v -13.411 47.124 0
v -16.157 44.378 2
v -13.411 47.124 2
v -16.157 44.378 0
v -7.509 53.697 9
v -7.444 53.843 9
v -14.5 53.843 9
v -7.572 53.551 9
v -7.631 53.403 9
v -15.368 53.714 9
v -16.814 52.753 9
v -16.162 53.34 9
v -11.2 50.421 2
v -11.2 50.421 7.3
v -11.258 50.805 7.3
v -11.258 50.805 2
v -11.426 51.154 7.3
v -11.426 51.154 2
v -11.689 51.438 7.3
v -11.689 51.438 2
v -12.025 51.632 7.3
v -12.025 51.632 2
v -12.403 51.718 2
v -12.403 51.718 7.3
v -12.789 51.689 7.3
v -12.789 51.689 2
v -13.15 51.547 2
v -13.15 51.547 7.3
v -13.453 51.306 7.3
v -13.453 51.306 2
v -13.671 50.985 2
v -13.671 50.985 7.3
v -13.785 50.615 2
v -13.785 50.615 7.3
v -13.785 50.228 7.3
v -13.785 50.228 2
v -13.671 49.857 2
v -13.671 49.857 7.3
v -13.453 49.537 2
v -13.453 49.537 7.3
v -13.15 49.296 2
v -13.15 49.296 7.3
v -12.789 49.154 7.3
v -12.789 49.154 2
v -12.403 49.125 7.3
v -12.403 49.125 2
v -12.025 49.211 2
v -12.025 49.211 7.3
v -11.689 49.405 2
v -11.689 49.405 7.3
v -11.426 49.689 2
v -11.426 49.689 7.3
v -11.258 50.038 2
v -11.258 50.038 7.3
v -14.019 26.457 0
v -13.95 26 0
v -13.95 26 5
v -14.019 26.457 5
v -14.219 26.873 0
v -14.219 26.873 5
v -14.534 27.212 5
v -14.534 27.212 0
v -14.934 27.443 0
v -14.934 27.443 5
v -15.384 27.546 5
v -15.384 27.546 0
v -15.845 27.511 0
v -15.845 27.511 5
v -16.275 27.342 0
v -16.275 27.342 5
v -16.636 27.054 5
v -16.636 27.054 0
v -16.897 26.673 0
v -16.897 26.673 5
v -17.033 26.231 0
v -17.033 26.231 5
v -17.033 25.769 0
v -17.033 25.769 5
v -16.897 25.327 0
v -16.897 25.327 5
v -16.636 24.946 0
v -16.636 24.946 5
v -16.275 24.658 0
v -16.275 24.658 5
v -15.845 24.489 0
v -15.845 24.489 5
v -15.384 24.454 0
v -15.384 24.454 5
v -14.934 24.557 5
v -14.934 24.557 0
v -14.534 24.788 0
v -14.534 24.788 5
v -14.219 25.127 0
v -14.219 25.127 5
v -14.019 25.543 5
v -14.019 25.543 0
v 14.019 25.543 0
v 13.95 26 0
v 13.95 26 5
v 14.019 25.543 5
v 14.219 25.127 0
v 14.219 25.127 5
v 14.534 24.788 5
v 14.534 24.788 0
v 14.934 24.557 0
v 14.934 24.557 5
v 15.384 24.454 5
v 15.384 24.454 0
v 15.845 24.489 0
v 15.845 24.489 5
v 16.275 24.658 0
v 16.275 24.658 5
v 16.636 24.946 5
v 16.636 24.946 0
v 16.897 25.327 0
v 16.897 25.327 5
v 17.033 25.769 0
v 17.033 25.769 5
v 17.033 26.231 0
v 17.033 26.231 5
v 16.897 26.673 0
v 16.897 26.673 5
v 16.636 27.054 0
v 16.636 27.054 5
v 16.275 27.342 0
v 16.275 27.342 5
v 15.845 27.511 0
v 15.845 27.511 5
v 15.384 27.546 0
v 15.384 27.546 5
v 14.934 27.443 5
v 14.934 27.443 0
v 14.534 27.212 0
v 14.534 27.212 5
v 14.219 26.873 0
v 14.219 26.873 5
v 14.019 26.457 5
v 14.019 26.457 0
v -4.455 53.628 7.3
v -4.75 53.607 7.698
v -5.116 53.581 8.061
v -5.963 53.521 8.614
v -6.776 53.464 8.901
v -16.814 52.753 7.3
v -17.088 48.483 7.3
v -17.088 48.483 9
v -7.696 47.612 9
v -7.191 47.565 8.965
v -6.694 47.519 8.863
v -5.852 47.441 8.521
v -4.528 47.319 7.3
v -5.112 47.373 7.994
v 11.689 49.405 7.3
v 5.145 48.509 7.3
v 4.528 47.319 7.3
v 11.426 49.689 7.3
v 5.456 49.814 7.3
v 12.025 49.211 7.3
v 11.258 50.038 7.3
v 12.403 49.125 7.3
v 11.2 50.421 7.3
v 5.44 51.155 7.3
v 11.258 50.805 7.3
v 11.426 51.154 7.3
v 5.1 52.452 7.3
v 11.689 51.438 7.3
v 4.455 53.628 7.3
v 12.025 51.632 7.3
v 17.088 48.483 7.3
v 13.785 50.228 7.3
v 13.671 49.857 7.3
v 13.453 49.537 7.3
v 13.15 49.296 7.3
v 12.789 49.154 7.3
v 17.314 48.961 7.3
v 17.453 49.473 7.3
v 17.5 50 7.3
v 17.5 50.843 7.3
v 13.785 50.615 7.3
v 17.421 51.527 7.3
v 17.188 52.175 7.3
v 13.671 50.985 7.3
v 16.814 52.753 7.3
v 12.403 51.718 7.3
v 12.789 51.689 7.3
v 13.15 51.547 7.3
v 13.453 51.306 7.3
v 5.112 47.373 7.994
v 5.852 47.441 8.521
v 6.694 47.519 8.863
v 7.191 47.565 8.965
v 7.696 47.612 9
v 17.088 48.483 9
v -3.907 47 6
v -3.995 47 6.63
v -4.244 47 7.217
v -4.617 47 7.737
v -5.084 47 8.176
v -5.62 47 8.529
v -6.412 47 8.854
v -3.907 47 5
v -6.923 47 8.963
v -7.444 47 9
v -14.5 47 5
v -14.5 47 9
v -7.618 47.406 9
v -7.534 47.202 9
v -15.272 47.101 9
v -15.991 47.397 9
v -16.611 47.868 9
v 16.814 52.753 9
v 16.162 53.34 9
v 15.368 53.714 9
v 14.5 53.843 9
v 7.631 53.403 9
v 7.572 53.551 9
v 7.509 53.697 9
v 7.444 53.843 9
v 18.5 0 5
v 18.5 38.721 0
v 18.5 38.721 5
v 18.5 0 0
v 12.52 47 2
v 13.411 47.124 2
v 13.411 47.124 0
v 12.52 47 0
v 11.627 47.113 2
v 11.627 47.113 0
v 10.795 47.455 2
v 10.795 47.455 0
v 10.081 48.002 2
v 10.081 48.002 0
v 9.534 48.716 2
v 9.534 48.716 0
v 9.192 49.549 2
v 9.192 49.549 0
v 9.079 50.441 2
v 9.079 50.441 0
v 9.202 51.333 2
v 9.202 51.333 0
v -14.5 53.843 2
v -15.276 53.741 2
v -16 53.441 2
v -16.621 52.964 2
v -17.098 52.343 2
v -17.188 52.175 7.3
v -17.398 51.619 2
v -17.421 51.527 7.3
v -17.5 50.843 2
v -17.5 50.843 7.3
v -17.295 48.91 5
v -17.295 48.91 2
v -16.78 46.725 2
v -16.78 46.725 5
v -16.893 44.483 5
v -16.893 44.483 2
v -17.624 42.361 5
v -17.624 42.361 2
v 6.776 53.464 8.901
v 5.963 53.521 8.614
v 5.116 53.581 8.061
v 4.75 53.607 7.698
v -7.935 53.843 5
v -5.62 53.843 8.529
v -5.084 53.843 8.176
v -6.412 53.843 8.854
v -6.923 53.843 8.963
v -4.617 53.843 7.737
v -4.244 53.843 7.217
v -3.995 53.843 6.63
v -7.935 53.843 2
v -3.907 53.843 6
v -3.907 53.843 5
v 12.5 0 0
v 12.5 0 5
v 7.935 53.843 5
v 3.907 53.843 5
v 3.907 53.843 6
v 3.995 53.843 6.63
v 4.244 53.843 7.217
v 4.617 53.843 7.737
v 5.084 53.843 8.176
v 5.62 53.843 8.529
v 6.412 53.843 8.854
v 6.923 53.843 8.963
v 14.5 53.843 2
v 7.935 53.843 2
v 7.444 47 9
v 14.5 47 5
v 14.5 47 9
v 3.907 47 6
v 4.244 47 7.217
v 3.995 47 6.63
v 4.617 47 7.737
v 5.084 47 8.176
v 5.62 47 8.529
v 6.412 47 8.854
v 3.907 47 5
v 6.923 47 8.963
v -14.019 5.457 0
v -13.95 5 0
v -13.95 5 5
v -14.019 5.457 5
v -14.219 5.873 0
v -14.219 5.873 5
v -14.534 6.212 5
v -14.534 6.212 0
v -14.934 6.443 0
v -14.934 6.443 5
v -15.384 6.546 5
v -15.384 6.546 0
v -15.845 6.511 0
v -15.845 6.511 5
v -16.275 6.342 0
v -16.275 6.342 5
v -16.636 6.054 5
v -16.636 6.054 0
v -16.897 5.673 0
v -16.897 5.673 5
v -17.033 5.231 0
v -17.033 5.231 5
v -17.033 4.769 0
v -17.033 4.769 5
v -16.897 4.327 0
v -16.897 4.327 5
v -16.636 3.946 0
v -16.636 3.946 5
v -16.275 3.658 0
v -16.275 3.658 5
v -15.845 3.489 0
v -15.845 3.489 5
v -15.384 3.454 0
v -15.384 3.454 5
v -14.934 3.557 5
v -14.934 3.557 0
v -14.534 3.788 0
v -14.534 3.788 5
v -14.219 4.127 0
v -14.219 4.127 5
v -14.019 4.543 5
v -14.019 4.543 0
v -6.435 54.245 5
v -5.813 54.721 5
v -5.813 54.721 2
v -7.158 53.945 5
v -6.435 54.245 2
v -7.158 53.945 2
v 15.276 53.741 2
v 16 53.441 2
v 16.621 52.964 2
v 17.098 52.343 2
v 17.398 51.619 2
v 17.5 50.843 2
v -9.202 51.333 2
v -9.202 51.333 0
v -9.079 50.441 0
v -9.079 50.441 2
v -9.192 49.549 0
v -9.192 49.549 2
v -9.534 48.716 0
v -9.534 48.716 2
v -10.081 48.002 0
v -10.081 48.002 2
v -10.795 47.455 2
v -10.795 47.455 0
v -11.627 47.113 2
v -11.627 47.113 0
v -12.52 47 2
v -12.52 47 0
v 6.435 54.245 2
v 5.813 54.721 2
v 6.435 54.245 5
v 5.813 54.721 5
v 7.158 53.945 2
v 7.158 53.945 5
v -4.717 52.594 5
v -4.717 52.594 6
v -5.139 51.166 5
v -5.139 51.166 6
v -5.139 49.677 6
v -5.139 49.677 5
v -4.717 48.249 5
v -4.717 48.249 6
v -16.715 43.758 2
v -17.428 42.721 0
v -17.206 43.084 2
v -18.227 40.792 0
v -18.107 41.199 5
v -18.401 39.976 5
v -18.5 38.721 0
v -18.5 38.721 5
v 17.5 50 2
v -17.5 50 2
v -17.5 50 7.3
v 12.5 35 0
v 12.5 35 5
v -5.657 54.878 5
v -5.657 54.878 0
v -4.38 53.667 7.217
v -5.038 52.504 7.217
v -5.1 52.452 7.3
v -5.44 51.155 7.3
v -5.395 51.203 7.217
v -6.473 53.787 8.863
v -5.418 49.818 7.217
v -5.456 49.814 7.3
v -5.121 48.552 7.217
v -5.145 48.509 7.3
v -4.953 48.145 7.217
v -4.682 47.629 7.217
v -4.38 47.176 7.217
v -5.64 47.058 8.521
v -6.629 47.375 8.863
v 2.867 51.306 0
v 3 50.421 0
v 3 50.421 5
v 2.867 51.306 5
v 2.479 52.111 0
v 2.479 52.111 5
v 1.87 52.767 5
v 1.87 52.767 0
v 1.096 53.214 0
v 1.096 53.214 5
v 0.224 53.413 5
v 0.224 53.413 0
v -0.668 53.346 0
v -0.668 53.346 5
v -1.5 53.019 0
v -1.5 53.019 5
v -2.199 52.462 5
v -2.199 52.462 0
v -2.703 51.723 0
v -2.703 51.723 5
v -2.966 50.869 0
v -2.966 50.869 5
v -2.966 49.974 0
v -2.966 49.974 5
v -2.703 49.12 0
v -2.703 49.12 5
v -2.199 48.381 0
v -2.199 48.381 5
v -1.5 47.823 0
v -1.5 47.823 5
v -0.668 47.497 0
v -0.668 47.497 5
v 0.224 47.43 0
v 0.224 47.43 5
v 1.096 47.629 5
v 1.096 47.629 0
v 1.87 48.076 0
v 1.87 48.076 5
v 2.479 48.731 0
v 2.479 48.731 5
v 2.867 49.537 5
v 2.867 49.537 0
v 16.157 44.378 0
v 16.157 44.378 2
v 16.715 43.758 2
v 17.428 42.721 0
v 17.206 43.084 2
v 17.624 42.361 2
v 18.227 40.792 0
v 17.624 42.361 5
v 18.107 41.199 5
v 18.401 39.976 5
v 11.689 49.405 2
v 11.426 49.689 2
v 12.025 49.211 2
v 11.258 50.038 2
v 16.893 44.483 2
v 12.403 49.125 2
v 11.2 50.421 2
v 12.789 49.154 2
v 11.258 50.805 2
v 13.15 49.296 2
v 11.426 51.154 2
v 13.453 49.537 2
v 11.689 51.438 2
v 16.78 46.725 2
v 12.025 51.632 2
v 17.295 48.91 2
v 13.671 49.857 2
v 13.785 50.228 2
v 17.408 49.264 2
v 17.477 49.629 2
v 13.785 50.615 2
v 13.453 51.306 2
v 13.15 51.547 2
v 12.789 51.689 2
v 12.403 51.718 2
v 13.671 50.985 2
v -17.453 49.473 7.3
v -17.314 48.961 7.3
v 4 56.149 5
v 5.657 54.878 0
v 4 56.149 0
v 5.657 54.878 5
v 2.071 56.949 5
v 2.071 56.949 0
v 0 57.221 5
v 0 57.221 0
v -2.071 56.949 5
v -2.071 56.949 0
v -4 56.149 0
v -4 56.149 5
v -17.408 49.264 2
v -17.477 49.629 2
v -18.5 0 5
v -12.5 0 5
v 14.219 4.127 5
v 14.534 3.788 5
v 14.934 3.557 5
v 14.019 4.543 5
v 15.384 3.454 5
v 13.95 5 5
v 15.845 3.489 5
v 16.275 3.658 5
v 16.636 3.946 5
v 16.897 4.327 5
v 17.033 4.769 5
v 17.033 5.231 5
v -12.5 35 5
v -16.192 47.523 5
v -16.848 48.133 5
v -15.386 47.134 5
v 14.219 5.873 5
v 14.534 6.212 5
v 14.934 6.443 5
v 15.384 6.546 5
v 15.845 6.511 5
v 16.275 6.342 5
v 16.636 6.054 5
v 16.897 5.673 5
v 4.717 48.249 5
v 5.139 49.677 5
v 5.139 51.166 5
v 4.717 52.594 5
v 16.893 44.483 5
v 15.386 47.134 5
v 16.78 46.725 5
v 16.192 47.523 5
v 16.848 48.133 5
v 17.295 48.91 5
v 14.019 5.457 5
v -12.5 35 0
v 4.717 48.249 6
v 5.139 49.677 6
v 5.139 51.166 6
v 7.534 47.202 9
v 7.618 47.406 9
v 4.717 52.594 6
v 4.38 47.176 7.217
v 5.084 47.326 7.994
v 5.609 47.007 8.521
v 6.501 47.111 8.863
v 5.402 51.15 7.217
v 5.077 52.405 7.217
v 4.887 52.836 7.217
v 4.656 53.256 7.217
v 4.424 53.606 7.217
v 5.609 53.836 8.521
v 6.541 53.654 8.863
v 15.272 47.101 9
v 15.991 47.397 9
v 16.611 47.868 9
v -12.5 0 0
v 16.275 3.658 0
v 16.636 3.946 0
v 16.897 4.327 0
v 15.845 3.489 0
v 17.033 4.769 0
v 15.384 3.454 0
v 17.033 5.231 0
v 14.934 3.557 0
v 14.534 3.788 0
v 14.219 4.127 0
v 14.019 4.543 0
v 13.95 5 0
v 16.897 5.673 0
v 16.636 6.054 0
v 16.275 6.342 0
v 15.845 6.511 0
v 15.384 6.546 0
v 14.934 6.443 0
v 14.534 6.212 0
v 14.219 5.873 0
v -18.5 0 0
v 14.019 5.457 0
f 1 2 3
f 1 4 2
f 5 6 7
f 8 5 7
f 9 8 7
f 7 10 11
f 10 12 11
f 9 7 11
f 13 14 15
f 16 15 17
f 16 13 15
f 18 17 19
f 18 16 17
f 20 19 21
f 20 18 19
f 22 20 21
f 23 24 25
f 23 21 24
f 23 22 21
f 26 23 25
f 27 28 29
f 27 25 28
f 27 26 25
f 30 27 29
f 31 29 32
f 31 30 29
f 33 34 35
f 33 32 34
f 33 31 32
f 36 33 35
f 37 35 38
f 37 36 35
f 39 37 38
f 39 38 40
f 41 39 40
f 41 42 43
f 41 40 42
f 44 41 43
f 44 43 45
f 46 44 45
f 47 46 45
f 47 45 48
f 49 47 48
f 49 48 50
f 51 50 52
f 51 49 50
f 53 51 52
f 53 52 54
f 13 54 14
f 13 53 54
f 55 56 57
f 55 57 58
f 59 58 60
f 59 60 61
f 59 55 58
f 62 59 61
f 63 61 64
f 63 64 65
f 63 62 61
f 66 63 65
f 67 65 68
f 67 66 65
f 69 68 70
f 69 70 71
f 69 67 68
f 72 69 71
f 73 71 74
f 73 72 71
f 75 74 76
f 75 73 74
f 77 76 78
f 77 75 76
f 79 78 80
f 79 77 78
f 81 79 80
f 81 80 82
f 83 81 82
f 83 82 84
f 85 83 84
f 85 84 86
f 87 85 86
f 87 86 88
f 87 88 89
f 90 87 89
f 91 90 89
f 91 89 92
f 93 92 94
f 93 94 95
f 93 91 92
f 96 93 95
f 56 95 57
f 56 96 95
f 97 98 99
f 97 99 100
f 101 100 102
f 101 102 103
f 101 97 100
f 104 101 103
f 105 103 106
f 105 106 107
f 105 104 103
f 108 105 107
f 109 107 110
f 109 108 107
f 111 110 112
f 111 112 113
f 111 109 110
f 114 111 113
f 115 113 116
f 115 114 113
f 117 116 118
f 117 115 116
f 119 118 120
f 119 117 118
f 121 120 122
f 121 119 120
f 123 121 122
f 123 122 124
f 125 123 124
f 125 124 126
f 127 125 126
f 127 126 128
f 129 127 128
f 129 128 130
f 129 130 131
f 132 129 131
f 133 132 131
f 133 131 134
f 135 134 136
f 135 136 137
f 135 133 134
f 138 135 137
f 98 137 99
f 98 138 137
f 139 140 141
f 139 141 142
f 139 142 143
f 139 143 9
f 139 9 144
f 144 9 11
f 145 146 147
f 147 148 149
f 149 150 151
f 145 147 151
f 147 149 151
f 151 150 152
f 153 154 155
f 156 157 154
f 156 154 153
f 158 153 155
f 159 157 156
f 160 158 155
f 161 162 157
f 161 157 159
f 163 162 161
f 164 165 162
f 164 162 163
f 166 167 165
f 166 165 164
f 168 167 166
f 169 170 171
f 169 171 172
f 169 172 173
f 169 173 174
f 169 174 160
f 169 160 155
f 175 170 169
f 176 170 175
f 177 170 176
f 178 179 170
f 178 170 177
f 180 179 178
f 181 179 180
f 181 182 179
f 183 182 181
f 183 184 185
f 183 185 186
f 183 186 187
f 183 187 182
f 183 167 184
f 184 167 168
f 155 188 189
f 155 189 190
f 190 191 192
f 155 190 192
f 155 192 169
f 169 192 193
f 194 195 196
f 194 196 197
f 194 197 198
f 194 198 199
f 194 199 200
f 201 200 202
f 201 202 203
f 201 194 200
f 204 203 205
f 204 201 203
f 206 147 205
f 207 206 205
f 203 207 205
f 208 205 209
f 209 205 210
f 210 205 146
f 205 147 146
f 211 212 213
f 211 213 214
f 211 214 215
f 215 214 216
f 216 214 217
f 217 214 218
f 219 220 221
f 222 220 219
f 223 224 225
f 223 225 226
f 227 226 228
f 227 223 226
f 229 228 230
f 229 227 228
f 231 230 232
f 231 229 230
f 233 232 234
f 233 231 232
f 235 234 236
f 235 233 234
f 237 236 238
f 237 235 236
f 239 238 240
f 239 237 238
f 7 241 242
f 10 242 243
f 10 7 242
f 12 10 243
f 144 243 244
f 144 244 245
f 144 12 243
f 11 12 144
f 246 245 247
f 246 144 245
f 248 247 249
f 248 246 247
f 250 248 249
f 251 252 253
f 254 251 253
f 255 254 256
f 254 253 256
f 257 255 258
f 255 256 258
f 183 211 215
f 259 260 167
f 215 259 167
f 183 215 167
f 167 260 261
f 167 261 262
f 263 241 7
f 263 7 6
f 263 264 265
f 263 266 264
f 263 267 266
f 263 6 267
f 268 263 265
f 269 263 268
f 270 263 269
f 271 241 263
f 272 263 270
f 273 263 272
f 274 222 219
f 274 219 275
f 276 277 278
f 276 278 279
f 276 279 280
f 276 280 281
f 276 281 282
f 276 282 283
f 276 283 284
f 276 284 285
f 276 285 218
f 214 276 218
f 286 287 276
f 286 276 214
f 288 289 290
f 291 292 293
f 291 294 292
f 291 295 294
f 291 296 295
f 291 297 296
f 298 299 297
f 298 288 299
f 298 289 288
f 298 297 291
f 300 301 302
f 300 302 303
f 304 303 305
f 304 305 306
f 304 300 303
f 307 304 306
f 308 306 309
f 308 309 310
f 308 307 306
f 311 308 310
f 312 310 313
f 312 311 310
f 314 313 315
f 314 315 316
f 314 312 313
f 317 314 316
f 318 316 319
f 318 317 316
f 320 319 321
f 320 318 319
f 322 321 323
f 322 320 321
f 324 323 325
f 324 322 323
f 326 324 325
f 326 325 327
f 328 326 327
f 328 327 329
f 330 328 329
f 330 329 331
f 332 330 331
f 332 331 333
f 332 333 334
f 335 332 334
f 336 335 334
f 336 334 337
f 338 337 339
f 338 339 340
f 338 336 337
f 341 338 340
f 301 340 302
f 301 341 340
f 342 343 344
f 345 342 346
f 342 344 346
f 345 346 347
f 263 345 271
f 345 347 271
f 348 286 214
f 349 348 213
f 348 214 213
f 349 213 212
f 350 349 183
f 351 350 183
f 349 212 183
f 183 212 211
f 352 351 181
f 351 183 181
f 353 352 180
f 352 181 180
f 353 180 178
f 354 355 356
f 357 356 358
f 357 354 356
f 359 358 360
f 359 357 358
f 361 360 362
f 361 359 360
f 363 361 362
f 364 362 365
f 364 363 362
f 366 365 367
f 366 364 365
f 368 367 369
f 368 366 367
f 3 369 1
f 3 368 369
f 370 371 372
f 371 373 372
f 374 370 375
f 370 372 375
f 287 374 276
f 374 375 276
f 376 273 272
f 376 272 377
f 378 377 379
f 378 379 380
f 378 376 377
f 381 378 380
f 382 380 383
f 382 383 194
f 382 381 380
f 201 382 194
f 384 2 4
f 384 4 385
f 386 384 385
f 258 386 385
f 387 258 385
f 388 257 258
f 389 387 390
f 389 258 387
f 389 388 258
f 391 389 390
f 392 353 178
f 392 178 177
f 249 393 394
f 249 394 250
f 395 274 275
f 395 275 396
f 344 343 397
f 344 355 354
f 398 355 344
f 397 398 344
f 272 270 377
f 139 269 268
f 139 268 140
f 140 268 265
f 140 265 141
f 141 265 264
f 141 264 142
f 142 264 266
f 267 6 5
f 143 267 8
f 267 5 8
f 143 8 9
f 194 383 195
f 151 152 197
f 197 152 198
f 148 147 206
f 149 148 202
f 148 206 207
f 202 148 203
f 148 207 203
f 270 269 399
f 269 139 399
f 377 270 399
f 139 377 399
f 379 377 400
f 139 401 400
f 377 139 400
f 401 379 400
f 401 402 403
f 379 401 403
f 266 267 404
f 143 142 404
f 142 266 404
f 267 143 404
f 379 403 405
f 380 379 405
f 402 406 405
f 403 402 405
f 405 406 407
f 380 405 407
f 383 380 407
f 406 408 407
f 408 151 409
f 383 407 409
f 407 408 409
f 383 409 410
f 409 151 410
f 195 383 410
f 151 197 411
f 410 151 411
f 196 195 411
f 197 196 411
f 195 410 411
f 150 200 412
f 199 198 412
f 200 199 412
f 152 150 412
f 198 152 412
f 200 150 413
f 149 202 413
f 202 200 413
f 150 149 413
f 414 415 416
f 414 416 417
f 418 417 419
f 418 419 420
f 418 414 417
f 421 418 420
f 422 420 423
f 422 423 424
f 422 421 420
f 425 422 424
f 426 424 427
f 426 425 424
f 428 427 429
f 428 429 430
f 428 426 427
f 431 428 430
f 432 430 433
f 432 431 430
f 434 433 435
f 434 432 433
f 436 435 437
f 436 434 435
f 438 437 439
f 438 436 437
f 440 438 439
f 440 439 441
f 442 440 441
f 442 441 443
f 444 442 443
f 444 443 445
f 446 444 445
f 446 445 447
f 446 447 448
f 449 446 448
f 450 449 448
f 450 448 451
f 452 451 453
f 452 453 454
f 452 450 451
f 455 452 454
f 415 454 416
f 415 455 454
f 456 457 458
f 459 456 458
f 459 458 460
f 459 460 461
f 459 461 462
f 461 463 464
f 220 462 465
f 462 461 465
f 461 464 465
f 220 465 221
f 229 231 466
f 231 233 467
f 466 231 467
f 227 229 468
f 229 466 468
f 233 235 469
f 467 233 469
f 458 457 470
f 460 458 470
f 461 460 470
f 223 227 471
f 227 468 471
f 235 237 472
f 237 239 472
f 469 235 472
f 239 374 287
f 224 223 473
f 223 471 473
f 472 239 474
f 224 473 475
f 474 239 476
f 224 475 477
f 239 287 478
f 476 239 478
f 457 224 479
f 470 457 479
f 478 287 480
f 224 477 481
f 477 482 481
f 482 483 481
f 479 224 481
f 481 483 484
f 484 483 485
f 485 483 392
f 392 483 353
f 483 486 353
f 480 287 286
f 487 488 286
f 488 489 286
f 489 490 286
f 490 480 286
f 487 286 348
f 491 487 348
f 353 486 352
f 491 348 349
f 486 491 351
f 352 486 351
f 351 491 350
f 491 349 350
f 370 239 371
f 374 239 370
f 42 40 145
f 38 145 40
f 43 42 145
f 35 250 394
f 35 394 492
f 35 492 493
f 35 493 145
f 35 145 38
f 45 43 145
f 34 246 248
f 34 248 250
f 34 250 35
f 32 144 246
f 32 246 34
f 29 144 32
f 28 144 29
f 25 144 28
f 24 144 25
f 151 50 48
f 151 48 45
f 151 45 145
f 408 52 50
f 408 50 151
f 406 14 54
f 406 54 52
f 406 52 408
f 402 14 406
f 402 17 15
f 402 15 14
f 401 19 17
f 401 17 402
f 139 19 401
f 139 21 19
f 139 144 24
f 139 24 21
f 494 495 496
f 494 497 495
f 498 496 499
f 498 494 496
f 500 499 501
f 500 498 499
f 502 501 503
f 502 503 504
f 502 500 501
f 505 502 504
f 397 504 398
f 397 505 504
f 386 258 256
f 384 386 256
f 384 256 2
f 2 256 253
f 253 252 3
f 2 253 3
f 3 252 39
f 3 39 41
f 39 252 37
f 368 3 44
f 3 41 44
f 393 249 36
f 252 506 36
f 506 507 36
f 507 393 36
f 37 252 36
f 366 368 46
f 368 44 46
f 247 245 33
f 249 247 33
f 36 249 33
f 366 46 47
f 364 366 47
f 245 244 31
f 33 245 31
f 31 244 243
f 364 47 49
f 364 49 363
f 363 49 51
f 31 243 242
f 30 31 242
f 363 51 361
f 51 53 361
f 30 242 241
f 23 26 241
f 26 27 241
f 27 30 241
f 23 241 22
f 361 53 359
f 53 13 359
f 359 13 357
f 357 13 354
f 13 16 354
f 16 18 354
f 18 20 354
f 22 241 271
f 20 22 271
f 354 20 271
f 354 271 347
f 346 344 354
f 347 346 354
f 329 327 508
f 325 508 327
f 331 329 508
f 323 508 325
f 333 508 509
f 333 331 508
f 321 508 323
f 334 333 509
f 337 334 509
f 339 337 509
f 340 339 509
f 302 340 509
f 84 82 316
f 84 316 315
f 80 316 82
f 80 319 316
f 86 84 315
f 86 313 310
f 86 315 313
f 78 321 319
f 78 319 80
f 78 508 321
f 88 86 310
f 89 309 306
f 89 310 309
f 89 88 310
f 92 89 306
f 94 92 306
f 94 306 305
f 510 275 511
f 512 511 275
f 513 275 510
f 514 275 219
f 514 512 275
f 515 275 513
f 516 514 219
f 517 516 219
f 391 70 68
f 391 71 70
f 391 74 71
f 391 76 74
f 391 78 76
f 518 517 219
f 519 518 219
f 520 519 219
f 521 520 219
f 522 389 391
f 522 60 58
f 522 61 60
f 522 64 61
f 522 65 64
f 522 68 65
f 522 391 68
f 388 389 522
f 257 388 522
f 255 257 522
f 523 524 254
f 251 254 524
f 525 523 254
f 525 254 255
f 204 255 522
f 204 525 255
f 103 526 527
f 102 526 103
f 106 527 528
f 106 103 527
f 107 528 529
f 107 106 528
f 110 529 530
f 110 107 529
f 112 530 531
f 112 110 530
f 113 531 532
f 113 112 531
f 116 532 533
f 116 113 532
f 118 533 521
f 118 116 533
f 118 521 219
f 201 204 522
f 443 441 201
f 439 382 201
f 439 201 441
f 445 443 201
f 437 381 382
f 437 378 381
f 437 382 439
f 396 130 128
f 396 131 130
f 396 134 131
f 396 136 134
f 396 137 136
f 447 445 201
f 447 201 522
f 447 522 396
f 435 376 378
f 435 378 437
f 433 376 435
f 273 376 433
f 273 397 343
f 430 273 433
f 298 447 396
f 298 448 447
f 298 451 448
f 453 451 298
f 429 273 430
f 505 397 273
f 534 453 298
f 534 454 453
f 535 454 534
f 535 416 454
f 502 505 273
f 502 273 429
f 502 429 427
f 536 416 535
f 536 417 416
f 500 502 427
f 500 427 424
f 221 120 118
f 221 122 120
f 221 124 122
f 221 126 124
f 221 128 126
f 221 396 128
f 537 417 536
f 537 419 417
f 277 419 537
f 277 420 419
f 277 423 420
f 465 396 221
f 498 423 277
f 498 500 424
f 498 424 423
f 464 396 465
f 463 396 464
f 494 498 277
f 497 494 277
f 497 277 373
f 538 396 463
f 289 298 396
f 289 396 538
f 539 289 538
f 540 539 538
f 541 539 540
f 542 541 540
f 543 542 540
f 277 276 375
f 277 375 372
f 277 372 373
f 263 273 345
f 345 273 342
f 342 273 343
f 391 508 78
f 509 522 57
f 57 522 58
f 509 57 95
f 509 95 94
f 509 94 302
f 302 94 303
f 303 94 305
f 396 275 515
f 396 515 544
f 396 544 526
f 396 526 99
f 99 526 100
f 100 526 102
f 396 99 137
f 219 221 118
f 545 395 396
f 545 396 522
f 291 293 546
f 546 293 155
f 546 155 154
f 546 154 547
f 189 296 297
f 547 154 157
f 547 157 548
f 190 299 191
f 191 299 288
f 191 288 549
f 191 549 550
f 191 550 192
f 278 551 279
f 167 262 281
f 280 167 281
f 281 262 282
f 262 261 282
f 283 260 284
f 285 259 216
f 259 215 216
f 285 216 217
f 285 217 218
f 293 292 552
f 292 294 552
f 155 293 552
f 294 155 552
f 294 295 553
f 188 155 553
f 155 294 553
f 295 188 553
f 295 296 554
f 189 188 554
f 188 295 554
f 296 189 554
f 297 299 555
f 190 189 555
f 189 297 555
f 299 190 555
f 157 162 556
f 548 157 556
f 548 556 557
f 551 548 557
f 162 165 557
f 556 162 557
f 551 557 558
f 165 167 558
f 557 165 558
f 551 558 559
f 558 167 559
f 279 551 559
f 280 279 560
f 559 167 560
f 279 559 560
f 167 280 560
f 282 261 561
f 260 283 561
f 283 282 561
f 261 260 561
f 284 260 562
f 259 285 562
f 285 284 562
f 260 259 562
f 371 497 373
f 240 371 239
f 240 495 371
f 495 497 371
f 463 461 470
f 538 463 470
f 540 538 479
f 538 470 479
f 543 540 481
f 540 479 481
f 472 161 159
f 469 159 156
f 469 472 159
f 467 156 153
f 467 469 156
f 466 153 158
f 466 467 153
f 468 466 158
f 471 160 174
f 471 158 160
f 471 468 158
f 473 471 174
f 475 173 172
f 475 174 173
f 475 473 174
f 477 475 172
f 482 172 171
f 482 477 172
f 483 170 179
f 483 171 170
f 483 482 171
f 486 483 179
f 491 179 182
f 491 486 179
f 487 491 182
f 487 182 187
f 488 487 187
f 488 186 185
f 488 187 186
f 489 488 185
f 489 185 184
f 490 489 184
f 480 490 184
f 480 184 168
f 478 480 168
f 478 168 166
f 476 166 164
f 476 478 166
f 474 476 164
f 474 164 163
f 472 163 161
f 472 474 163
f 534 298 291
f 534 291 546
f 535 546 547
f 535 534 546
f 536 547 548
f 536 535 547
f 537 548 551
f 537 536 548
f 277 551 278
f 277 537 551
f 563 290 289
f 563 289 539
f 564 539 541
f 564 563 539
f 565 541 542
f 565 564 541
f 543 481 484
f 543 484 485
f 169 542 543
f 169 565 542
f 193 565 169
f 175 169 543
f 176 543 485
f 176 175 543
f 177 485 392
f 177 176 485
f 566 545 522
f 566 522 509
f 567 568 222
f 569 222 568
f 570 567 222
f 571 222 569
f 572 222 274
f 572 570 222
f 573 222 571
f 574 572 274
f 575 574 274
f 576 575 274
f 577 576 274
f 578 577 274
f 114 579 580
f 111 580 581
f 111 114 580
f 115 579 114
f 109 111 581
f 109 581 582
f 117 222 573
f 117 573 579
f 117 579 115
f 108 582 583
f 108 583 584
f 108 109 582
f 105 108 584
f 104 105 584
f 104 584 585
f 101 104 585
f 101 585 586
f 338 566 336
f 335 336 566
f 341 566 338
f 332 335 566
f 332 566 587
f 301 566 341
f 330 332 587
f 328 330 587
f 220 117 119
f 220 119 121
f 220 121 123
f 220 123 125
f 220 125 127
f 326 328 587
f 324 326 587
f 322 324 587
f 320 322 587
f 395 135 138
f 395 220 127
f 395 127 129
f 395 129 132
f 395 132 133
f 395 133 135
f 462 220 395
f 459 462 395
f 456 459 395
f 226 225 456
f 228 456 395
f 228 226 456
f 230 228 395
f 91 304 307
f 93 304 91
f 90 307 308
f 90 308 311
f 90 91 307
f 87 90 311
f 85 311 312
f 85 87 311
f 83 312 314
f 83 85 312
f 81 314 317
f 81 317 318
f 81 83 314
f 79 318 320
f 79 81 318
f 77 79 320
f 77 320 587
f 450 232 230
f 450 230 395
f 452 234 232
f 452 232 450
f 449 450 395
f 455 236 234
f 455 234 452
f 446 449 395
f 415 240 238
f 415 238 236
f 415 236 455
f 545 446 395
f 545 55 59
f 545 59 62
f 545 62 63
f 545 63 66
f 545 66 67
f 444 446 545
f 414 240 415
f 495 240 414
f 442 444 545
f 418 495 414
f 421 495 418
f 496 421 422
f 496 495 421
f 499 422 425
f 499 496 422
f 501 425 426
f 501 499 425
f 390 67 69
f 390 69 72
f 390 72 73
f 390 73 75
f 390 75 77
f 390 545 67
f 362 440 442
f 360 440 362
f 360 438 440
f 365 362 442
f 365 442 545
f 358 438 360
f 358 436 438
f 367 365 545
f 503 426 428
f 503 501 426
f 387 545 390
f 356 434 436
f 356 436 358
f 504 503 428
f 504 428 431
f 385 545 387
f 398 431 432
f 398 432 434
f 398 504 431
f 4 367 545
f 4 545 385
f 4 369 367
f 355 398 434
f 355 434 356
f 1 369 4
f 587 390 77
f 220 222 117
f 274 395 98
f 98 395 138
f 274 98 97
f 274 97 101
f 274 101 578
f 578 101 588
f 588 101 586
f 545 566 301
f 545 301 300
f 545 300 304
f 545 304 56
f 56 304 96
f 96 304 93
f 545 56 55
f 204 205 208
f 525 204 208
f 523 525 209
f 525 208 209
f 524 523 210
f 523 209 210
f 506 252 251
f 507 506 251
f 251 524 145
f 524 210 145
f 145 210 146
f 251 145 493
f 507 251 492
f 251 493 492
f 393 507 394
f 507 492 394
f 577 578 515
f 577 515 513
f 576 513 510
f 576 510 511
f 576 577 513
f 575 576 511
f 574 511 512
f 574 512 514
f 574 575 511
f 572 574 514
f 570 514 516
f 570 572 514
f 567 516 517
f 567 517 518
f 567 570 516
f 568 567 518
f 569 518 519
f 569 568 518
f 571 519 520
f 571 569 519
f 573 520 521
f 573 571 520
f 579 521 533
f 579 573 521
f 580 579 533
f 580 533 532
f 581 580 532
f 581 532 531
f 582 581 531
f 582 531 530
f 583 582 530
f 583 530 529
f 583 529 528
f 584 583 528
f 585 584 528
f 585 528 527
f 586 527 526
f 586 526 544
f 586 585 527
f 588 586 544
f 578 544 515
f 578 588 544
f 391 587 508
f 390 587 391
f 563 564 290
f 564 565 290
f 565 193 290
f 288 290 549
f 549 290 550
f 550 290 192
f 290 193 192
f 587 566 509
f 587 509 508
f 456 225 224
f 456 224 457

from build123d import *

# Parameters (mm, degrees)
SKETCH_1_R           = 3
SKETCH_1_R_2         = 1.55
EXTRUDE_1_DEPTH      = 5
EXTRUDE_2_DEPTH      = 4
EXTRUDE_2_DEPTH_BACK = 3
SKETCH_2_R           = 1.3
FILLET_1_R           = 8
FILLET_2_R           = 3
CUT_EXTRUDE_1_REACH  = 62.544
SKETCH_3_R           = 3.421397557
CUT_EXTRUDE_2_DEPTH  = 1.7
FILLET_START         = 2
FILLET_3_DEPTH       = 3


with BuildPart() as part:
    # 草图1 → 凸台-拉伸1 (new body)
    with BuildSketch(Plane.XY):
        Polygon((-12.5, 0), (-18.5, 0), (-18.5, 42.034916596), (0, 60.534916596), (18.5, 42.034916596), (18.5, 0), (12.5, 0), (12.5, 35), (-12.5, 35), align=None)
        with Locations((0, 50.421397557)):
            Circle(SKETCH_1_R, mode=Mode.SUBTRACT)
        with Locations((-15.5, 5)):
            Circle(SKETCH_1_R_2, mode=Mode.SUBTRACT)
        with Locations((-15.5, 26)):
            Circle(SKETCH_1_R_2, mode=Mode.SUBTRACT)
        with Locations(Location((15.5, 5, 0), (0, 0, 180))):
            Circle(SKETCH_1_R_2, mode=Mode.SUBTRACT)
        with Locations(Location((15.5, 26, 0), (0, 0, 180))):
            Circle(SKETCH_1_R_2, mode=Mode.SUBTRACT)
    extrude(amount=EXTRUDE_1_DEPTH)

    # 草图2 → 凸台-拉伸2 (add, two sides: drawn at the far end of the back side and taken through both)
    # profile 1 of 2: a face of its own
    with BuildSketch(Plane.XY.offset(5).offset(-EXTRUDE_2_DEPTH_BACK)):
        with BuildLine():
            Line((17.5, 47), (3.906515802, 47))
            ThreePointArc((3.906515802, 47), (5.192959363, 50.421397557), (3.906515802, 53.842795113))
            Line((3.906515802, 53.842795113), (17.5, 53.842795113))
            Line((17.5, 53.842795113), (17.5, 47))
        make_face()
        with Locations(Location((12.5, 50.421397557, 0), (0, 0, 180))):
            Circle(SKETCH_2_R, mode=Mode.SUBTRACT)
    # profile 2 of 2: a face of its own
    with BuildSketch(Plane.XY.offset(5).offset(-EXTRUDE_2_DEPTH_BACK)):
        with BuildLine():
            Line((-17.5, 47), (-17.5, 53.842795113))
            Line((-17.5, 53.842795113), (-3.906515802, 53.842795113))
            ThreePointArc((-3.906515802, 53.842795113), (-5.192959363, 50.421397557), (-3.906515802, 47))
            Line((-3.906515802, 47), (-17.5, 47))
        make_face()
        with Locations((-12.5, 50.421397557)):
            Circle(SKETCH_2_R, mode=Mode.SUBTRACT)
    extrude(amount=EXTRUDE_2_DEPTH + EXTRUDE_2_DEPTH_BACK)

    # 圆角1
    fillet_1_edges = [part.edges().sort_by_distance(p)[0] for p in [
        (-18.5, 42.034916596, 2.5),
        (0, 60.534916596, 2.5),
        (18.5, 42.034916596, 2.5),
    ]]
    fillet(fillet_1_edges, radius=FILLET_1_R)

    # 圆角2
    fillet_2_edges = [part.edges().sort_by_distance(p)[0] for p in [
        (-6.692121483, 53.842795113, 3.5),
        (-17.5, 47, 5.5),
        (-5.192959363, 50.421397557, 9),
        (-17.5, 53.842795113, 5.5),
        (6.692121483, 53.842795113, 3.5),
        (17.5, 53.842795113, 5.5),
        (5.192959363, 50.421397557, 9),
        (17.5, 47, 5.5),
    ]]
    fillet(fillet_2_edges, radius=FILLET_2_R)

    # 草图3 → 切除-拉伸1 (cut, up to next)
    with BuildSketch(Plane(origin=(0, 0, 2), x_dir=(-1, 0, 0), z_dir=(0, 0, -1)), mode=Mode.PRIVATE) as cut_extrude_1_sk1:
        with Locations((-12.5, 50.421397557)):
            Circle(SKETCH_3_R)
    cut_extrude_1_tool1 = extrude(cut_extrude_1_sk1.sketch, amount=CUT_EXTRUDE_1_REACH, mode=Mode.PRIVATE) & part.part
    # 草图3 → 切除-拉伸1 (cut, up to next)
    with BuildSketch(Plane(origin=(0, 0, 2), x_dir=(-1, 0, 0), z_dir=(0, 0, -1)), mode=Mode.PRIVATE) as cut_extrude_1_sk2:
        with Locations((12.5, 50.421397557)):
            Circle(SKETCH_3_R)
    cut_extrude_1_tool2 = extrude(cut_extrude_1_sk2.sketch, amount=CUT_EXTRUDE_1_REACH, mode=Mode.PRIVATE) & part.part
    add(cut_extrude_1_tool1.solids().sort_by_distance((12.5, 50.421398, 2))[0], mode=Mode.SUBTRACT)
    add(cut_extrude_1_tool2.solids().sort_by_distance((-12.5, 50.421398, 2))[0], mode=Mode.SUBTRACT)

    # 草图4 → 切除-拉伸2 (cut)
    with BuildSketch(Plane.XY.offset(9)):
        Polygon((0, 46.899022366), (43.079074711, 50.891584803), (0, 53.943772747), (-43.079074711, 50.891584803), align=None)
    extrude(amount=-CUT_EXTRUDE_2_DEPTH, mode=Mode.SUBTRACT)

    # 圆角3: read off the stored shape, not the designer's step
    # 圆角3 outline → 圆角3 (add)
    with BuildSketch(Plane.XY.offset(FILLET_START)):
        with BuildLine():
            ThreePointArc((17.623806552, 42.361452624), (16.757691875, 45.600251323), (17.294803574, 48.909553768))
            ThreePointArc((17.294803574, 48.909553768), (16.192433353, 47.52297167), (14.5, 47))
            Line((14.5, 47), (13.534916596, 47))
            Line((13.534916596, 47), (16.156854249, 44.378062347))
            ThreePointArc((16.156854249, 44.378062347), (16.969389563, 43.42726788), (17.623806552, 42.361452624))
        make_face()
        with BuildLine():
            ThreePointArc((-14.5, 47), (-16.192433353, 47.52297167), (-17.294803574, 48.909553768))
            ThreePointArc((-17.294803574, 48.909553768), (-16.757691875, 45.600251323), (-17.623806552, 42.361452624))
            ThreePointArc((-17.623806552, 42.361452624), (-16.969389563, 43.42726788), (-16.156854249, 44.378062347))
            Line((-16.156854249, 44.378062347), (-13.534916596, 47))
            Line((-13.534916596, 47), (-14.5, 47))
        make_face()
    extrude(amount=FILLET_3_DEPTH)


solid = part.part
